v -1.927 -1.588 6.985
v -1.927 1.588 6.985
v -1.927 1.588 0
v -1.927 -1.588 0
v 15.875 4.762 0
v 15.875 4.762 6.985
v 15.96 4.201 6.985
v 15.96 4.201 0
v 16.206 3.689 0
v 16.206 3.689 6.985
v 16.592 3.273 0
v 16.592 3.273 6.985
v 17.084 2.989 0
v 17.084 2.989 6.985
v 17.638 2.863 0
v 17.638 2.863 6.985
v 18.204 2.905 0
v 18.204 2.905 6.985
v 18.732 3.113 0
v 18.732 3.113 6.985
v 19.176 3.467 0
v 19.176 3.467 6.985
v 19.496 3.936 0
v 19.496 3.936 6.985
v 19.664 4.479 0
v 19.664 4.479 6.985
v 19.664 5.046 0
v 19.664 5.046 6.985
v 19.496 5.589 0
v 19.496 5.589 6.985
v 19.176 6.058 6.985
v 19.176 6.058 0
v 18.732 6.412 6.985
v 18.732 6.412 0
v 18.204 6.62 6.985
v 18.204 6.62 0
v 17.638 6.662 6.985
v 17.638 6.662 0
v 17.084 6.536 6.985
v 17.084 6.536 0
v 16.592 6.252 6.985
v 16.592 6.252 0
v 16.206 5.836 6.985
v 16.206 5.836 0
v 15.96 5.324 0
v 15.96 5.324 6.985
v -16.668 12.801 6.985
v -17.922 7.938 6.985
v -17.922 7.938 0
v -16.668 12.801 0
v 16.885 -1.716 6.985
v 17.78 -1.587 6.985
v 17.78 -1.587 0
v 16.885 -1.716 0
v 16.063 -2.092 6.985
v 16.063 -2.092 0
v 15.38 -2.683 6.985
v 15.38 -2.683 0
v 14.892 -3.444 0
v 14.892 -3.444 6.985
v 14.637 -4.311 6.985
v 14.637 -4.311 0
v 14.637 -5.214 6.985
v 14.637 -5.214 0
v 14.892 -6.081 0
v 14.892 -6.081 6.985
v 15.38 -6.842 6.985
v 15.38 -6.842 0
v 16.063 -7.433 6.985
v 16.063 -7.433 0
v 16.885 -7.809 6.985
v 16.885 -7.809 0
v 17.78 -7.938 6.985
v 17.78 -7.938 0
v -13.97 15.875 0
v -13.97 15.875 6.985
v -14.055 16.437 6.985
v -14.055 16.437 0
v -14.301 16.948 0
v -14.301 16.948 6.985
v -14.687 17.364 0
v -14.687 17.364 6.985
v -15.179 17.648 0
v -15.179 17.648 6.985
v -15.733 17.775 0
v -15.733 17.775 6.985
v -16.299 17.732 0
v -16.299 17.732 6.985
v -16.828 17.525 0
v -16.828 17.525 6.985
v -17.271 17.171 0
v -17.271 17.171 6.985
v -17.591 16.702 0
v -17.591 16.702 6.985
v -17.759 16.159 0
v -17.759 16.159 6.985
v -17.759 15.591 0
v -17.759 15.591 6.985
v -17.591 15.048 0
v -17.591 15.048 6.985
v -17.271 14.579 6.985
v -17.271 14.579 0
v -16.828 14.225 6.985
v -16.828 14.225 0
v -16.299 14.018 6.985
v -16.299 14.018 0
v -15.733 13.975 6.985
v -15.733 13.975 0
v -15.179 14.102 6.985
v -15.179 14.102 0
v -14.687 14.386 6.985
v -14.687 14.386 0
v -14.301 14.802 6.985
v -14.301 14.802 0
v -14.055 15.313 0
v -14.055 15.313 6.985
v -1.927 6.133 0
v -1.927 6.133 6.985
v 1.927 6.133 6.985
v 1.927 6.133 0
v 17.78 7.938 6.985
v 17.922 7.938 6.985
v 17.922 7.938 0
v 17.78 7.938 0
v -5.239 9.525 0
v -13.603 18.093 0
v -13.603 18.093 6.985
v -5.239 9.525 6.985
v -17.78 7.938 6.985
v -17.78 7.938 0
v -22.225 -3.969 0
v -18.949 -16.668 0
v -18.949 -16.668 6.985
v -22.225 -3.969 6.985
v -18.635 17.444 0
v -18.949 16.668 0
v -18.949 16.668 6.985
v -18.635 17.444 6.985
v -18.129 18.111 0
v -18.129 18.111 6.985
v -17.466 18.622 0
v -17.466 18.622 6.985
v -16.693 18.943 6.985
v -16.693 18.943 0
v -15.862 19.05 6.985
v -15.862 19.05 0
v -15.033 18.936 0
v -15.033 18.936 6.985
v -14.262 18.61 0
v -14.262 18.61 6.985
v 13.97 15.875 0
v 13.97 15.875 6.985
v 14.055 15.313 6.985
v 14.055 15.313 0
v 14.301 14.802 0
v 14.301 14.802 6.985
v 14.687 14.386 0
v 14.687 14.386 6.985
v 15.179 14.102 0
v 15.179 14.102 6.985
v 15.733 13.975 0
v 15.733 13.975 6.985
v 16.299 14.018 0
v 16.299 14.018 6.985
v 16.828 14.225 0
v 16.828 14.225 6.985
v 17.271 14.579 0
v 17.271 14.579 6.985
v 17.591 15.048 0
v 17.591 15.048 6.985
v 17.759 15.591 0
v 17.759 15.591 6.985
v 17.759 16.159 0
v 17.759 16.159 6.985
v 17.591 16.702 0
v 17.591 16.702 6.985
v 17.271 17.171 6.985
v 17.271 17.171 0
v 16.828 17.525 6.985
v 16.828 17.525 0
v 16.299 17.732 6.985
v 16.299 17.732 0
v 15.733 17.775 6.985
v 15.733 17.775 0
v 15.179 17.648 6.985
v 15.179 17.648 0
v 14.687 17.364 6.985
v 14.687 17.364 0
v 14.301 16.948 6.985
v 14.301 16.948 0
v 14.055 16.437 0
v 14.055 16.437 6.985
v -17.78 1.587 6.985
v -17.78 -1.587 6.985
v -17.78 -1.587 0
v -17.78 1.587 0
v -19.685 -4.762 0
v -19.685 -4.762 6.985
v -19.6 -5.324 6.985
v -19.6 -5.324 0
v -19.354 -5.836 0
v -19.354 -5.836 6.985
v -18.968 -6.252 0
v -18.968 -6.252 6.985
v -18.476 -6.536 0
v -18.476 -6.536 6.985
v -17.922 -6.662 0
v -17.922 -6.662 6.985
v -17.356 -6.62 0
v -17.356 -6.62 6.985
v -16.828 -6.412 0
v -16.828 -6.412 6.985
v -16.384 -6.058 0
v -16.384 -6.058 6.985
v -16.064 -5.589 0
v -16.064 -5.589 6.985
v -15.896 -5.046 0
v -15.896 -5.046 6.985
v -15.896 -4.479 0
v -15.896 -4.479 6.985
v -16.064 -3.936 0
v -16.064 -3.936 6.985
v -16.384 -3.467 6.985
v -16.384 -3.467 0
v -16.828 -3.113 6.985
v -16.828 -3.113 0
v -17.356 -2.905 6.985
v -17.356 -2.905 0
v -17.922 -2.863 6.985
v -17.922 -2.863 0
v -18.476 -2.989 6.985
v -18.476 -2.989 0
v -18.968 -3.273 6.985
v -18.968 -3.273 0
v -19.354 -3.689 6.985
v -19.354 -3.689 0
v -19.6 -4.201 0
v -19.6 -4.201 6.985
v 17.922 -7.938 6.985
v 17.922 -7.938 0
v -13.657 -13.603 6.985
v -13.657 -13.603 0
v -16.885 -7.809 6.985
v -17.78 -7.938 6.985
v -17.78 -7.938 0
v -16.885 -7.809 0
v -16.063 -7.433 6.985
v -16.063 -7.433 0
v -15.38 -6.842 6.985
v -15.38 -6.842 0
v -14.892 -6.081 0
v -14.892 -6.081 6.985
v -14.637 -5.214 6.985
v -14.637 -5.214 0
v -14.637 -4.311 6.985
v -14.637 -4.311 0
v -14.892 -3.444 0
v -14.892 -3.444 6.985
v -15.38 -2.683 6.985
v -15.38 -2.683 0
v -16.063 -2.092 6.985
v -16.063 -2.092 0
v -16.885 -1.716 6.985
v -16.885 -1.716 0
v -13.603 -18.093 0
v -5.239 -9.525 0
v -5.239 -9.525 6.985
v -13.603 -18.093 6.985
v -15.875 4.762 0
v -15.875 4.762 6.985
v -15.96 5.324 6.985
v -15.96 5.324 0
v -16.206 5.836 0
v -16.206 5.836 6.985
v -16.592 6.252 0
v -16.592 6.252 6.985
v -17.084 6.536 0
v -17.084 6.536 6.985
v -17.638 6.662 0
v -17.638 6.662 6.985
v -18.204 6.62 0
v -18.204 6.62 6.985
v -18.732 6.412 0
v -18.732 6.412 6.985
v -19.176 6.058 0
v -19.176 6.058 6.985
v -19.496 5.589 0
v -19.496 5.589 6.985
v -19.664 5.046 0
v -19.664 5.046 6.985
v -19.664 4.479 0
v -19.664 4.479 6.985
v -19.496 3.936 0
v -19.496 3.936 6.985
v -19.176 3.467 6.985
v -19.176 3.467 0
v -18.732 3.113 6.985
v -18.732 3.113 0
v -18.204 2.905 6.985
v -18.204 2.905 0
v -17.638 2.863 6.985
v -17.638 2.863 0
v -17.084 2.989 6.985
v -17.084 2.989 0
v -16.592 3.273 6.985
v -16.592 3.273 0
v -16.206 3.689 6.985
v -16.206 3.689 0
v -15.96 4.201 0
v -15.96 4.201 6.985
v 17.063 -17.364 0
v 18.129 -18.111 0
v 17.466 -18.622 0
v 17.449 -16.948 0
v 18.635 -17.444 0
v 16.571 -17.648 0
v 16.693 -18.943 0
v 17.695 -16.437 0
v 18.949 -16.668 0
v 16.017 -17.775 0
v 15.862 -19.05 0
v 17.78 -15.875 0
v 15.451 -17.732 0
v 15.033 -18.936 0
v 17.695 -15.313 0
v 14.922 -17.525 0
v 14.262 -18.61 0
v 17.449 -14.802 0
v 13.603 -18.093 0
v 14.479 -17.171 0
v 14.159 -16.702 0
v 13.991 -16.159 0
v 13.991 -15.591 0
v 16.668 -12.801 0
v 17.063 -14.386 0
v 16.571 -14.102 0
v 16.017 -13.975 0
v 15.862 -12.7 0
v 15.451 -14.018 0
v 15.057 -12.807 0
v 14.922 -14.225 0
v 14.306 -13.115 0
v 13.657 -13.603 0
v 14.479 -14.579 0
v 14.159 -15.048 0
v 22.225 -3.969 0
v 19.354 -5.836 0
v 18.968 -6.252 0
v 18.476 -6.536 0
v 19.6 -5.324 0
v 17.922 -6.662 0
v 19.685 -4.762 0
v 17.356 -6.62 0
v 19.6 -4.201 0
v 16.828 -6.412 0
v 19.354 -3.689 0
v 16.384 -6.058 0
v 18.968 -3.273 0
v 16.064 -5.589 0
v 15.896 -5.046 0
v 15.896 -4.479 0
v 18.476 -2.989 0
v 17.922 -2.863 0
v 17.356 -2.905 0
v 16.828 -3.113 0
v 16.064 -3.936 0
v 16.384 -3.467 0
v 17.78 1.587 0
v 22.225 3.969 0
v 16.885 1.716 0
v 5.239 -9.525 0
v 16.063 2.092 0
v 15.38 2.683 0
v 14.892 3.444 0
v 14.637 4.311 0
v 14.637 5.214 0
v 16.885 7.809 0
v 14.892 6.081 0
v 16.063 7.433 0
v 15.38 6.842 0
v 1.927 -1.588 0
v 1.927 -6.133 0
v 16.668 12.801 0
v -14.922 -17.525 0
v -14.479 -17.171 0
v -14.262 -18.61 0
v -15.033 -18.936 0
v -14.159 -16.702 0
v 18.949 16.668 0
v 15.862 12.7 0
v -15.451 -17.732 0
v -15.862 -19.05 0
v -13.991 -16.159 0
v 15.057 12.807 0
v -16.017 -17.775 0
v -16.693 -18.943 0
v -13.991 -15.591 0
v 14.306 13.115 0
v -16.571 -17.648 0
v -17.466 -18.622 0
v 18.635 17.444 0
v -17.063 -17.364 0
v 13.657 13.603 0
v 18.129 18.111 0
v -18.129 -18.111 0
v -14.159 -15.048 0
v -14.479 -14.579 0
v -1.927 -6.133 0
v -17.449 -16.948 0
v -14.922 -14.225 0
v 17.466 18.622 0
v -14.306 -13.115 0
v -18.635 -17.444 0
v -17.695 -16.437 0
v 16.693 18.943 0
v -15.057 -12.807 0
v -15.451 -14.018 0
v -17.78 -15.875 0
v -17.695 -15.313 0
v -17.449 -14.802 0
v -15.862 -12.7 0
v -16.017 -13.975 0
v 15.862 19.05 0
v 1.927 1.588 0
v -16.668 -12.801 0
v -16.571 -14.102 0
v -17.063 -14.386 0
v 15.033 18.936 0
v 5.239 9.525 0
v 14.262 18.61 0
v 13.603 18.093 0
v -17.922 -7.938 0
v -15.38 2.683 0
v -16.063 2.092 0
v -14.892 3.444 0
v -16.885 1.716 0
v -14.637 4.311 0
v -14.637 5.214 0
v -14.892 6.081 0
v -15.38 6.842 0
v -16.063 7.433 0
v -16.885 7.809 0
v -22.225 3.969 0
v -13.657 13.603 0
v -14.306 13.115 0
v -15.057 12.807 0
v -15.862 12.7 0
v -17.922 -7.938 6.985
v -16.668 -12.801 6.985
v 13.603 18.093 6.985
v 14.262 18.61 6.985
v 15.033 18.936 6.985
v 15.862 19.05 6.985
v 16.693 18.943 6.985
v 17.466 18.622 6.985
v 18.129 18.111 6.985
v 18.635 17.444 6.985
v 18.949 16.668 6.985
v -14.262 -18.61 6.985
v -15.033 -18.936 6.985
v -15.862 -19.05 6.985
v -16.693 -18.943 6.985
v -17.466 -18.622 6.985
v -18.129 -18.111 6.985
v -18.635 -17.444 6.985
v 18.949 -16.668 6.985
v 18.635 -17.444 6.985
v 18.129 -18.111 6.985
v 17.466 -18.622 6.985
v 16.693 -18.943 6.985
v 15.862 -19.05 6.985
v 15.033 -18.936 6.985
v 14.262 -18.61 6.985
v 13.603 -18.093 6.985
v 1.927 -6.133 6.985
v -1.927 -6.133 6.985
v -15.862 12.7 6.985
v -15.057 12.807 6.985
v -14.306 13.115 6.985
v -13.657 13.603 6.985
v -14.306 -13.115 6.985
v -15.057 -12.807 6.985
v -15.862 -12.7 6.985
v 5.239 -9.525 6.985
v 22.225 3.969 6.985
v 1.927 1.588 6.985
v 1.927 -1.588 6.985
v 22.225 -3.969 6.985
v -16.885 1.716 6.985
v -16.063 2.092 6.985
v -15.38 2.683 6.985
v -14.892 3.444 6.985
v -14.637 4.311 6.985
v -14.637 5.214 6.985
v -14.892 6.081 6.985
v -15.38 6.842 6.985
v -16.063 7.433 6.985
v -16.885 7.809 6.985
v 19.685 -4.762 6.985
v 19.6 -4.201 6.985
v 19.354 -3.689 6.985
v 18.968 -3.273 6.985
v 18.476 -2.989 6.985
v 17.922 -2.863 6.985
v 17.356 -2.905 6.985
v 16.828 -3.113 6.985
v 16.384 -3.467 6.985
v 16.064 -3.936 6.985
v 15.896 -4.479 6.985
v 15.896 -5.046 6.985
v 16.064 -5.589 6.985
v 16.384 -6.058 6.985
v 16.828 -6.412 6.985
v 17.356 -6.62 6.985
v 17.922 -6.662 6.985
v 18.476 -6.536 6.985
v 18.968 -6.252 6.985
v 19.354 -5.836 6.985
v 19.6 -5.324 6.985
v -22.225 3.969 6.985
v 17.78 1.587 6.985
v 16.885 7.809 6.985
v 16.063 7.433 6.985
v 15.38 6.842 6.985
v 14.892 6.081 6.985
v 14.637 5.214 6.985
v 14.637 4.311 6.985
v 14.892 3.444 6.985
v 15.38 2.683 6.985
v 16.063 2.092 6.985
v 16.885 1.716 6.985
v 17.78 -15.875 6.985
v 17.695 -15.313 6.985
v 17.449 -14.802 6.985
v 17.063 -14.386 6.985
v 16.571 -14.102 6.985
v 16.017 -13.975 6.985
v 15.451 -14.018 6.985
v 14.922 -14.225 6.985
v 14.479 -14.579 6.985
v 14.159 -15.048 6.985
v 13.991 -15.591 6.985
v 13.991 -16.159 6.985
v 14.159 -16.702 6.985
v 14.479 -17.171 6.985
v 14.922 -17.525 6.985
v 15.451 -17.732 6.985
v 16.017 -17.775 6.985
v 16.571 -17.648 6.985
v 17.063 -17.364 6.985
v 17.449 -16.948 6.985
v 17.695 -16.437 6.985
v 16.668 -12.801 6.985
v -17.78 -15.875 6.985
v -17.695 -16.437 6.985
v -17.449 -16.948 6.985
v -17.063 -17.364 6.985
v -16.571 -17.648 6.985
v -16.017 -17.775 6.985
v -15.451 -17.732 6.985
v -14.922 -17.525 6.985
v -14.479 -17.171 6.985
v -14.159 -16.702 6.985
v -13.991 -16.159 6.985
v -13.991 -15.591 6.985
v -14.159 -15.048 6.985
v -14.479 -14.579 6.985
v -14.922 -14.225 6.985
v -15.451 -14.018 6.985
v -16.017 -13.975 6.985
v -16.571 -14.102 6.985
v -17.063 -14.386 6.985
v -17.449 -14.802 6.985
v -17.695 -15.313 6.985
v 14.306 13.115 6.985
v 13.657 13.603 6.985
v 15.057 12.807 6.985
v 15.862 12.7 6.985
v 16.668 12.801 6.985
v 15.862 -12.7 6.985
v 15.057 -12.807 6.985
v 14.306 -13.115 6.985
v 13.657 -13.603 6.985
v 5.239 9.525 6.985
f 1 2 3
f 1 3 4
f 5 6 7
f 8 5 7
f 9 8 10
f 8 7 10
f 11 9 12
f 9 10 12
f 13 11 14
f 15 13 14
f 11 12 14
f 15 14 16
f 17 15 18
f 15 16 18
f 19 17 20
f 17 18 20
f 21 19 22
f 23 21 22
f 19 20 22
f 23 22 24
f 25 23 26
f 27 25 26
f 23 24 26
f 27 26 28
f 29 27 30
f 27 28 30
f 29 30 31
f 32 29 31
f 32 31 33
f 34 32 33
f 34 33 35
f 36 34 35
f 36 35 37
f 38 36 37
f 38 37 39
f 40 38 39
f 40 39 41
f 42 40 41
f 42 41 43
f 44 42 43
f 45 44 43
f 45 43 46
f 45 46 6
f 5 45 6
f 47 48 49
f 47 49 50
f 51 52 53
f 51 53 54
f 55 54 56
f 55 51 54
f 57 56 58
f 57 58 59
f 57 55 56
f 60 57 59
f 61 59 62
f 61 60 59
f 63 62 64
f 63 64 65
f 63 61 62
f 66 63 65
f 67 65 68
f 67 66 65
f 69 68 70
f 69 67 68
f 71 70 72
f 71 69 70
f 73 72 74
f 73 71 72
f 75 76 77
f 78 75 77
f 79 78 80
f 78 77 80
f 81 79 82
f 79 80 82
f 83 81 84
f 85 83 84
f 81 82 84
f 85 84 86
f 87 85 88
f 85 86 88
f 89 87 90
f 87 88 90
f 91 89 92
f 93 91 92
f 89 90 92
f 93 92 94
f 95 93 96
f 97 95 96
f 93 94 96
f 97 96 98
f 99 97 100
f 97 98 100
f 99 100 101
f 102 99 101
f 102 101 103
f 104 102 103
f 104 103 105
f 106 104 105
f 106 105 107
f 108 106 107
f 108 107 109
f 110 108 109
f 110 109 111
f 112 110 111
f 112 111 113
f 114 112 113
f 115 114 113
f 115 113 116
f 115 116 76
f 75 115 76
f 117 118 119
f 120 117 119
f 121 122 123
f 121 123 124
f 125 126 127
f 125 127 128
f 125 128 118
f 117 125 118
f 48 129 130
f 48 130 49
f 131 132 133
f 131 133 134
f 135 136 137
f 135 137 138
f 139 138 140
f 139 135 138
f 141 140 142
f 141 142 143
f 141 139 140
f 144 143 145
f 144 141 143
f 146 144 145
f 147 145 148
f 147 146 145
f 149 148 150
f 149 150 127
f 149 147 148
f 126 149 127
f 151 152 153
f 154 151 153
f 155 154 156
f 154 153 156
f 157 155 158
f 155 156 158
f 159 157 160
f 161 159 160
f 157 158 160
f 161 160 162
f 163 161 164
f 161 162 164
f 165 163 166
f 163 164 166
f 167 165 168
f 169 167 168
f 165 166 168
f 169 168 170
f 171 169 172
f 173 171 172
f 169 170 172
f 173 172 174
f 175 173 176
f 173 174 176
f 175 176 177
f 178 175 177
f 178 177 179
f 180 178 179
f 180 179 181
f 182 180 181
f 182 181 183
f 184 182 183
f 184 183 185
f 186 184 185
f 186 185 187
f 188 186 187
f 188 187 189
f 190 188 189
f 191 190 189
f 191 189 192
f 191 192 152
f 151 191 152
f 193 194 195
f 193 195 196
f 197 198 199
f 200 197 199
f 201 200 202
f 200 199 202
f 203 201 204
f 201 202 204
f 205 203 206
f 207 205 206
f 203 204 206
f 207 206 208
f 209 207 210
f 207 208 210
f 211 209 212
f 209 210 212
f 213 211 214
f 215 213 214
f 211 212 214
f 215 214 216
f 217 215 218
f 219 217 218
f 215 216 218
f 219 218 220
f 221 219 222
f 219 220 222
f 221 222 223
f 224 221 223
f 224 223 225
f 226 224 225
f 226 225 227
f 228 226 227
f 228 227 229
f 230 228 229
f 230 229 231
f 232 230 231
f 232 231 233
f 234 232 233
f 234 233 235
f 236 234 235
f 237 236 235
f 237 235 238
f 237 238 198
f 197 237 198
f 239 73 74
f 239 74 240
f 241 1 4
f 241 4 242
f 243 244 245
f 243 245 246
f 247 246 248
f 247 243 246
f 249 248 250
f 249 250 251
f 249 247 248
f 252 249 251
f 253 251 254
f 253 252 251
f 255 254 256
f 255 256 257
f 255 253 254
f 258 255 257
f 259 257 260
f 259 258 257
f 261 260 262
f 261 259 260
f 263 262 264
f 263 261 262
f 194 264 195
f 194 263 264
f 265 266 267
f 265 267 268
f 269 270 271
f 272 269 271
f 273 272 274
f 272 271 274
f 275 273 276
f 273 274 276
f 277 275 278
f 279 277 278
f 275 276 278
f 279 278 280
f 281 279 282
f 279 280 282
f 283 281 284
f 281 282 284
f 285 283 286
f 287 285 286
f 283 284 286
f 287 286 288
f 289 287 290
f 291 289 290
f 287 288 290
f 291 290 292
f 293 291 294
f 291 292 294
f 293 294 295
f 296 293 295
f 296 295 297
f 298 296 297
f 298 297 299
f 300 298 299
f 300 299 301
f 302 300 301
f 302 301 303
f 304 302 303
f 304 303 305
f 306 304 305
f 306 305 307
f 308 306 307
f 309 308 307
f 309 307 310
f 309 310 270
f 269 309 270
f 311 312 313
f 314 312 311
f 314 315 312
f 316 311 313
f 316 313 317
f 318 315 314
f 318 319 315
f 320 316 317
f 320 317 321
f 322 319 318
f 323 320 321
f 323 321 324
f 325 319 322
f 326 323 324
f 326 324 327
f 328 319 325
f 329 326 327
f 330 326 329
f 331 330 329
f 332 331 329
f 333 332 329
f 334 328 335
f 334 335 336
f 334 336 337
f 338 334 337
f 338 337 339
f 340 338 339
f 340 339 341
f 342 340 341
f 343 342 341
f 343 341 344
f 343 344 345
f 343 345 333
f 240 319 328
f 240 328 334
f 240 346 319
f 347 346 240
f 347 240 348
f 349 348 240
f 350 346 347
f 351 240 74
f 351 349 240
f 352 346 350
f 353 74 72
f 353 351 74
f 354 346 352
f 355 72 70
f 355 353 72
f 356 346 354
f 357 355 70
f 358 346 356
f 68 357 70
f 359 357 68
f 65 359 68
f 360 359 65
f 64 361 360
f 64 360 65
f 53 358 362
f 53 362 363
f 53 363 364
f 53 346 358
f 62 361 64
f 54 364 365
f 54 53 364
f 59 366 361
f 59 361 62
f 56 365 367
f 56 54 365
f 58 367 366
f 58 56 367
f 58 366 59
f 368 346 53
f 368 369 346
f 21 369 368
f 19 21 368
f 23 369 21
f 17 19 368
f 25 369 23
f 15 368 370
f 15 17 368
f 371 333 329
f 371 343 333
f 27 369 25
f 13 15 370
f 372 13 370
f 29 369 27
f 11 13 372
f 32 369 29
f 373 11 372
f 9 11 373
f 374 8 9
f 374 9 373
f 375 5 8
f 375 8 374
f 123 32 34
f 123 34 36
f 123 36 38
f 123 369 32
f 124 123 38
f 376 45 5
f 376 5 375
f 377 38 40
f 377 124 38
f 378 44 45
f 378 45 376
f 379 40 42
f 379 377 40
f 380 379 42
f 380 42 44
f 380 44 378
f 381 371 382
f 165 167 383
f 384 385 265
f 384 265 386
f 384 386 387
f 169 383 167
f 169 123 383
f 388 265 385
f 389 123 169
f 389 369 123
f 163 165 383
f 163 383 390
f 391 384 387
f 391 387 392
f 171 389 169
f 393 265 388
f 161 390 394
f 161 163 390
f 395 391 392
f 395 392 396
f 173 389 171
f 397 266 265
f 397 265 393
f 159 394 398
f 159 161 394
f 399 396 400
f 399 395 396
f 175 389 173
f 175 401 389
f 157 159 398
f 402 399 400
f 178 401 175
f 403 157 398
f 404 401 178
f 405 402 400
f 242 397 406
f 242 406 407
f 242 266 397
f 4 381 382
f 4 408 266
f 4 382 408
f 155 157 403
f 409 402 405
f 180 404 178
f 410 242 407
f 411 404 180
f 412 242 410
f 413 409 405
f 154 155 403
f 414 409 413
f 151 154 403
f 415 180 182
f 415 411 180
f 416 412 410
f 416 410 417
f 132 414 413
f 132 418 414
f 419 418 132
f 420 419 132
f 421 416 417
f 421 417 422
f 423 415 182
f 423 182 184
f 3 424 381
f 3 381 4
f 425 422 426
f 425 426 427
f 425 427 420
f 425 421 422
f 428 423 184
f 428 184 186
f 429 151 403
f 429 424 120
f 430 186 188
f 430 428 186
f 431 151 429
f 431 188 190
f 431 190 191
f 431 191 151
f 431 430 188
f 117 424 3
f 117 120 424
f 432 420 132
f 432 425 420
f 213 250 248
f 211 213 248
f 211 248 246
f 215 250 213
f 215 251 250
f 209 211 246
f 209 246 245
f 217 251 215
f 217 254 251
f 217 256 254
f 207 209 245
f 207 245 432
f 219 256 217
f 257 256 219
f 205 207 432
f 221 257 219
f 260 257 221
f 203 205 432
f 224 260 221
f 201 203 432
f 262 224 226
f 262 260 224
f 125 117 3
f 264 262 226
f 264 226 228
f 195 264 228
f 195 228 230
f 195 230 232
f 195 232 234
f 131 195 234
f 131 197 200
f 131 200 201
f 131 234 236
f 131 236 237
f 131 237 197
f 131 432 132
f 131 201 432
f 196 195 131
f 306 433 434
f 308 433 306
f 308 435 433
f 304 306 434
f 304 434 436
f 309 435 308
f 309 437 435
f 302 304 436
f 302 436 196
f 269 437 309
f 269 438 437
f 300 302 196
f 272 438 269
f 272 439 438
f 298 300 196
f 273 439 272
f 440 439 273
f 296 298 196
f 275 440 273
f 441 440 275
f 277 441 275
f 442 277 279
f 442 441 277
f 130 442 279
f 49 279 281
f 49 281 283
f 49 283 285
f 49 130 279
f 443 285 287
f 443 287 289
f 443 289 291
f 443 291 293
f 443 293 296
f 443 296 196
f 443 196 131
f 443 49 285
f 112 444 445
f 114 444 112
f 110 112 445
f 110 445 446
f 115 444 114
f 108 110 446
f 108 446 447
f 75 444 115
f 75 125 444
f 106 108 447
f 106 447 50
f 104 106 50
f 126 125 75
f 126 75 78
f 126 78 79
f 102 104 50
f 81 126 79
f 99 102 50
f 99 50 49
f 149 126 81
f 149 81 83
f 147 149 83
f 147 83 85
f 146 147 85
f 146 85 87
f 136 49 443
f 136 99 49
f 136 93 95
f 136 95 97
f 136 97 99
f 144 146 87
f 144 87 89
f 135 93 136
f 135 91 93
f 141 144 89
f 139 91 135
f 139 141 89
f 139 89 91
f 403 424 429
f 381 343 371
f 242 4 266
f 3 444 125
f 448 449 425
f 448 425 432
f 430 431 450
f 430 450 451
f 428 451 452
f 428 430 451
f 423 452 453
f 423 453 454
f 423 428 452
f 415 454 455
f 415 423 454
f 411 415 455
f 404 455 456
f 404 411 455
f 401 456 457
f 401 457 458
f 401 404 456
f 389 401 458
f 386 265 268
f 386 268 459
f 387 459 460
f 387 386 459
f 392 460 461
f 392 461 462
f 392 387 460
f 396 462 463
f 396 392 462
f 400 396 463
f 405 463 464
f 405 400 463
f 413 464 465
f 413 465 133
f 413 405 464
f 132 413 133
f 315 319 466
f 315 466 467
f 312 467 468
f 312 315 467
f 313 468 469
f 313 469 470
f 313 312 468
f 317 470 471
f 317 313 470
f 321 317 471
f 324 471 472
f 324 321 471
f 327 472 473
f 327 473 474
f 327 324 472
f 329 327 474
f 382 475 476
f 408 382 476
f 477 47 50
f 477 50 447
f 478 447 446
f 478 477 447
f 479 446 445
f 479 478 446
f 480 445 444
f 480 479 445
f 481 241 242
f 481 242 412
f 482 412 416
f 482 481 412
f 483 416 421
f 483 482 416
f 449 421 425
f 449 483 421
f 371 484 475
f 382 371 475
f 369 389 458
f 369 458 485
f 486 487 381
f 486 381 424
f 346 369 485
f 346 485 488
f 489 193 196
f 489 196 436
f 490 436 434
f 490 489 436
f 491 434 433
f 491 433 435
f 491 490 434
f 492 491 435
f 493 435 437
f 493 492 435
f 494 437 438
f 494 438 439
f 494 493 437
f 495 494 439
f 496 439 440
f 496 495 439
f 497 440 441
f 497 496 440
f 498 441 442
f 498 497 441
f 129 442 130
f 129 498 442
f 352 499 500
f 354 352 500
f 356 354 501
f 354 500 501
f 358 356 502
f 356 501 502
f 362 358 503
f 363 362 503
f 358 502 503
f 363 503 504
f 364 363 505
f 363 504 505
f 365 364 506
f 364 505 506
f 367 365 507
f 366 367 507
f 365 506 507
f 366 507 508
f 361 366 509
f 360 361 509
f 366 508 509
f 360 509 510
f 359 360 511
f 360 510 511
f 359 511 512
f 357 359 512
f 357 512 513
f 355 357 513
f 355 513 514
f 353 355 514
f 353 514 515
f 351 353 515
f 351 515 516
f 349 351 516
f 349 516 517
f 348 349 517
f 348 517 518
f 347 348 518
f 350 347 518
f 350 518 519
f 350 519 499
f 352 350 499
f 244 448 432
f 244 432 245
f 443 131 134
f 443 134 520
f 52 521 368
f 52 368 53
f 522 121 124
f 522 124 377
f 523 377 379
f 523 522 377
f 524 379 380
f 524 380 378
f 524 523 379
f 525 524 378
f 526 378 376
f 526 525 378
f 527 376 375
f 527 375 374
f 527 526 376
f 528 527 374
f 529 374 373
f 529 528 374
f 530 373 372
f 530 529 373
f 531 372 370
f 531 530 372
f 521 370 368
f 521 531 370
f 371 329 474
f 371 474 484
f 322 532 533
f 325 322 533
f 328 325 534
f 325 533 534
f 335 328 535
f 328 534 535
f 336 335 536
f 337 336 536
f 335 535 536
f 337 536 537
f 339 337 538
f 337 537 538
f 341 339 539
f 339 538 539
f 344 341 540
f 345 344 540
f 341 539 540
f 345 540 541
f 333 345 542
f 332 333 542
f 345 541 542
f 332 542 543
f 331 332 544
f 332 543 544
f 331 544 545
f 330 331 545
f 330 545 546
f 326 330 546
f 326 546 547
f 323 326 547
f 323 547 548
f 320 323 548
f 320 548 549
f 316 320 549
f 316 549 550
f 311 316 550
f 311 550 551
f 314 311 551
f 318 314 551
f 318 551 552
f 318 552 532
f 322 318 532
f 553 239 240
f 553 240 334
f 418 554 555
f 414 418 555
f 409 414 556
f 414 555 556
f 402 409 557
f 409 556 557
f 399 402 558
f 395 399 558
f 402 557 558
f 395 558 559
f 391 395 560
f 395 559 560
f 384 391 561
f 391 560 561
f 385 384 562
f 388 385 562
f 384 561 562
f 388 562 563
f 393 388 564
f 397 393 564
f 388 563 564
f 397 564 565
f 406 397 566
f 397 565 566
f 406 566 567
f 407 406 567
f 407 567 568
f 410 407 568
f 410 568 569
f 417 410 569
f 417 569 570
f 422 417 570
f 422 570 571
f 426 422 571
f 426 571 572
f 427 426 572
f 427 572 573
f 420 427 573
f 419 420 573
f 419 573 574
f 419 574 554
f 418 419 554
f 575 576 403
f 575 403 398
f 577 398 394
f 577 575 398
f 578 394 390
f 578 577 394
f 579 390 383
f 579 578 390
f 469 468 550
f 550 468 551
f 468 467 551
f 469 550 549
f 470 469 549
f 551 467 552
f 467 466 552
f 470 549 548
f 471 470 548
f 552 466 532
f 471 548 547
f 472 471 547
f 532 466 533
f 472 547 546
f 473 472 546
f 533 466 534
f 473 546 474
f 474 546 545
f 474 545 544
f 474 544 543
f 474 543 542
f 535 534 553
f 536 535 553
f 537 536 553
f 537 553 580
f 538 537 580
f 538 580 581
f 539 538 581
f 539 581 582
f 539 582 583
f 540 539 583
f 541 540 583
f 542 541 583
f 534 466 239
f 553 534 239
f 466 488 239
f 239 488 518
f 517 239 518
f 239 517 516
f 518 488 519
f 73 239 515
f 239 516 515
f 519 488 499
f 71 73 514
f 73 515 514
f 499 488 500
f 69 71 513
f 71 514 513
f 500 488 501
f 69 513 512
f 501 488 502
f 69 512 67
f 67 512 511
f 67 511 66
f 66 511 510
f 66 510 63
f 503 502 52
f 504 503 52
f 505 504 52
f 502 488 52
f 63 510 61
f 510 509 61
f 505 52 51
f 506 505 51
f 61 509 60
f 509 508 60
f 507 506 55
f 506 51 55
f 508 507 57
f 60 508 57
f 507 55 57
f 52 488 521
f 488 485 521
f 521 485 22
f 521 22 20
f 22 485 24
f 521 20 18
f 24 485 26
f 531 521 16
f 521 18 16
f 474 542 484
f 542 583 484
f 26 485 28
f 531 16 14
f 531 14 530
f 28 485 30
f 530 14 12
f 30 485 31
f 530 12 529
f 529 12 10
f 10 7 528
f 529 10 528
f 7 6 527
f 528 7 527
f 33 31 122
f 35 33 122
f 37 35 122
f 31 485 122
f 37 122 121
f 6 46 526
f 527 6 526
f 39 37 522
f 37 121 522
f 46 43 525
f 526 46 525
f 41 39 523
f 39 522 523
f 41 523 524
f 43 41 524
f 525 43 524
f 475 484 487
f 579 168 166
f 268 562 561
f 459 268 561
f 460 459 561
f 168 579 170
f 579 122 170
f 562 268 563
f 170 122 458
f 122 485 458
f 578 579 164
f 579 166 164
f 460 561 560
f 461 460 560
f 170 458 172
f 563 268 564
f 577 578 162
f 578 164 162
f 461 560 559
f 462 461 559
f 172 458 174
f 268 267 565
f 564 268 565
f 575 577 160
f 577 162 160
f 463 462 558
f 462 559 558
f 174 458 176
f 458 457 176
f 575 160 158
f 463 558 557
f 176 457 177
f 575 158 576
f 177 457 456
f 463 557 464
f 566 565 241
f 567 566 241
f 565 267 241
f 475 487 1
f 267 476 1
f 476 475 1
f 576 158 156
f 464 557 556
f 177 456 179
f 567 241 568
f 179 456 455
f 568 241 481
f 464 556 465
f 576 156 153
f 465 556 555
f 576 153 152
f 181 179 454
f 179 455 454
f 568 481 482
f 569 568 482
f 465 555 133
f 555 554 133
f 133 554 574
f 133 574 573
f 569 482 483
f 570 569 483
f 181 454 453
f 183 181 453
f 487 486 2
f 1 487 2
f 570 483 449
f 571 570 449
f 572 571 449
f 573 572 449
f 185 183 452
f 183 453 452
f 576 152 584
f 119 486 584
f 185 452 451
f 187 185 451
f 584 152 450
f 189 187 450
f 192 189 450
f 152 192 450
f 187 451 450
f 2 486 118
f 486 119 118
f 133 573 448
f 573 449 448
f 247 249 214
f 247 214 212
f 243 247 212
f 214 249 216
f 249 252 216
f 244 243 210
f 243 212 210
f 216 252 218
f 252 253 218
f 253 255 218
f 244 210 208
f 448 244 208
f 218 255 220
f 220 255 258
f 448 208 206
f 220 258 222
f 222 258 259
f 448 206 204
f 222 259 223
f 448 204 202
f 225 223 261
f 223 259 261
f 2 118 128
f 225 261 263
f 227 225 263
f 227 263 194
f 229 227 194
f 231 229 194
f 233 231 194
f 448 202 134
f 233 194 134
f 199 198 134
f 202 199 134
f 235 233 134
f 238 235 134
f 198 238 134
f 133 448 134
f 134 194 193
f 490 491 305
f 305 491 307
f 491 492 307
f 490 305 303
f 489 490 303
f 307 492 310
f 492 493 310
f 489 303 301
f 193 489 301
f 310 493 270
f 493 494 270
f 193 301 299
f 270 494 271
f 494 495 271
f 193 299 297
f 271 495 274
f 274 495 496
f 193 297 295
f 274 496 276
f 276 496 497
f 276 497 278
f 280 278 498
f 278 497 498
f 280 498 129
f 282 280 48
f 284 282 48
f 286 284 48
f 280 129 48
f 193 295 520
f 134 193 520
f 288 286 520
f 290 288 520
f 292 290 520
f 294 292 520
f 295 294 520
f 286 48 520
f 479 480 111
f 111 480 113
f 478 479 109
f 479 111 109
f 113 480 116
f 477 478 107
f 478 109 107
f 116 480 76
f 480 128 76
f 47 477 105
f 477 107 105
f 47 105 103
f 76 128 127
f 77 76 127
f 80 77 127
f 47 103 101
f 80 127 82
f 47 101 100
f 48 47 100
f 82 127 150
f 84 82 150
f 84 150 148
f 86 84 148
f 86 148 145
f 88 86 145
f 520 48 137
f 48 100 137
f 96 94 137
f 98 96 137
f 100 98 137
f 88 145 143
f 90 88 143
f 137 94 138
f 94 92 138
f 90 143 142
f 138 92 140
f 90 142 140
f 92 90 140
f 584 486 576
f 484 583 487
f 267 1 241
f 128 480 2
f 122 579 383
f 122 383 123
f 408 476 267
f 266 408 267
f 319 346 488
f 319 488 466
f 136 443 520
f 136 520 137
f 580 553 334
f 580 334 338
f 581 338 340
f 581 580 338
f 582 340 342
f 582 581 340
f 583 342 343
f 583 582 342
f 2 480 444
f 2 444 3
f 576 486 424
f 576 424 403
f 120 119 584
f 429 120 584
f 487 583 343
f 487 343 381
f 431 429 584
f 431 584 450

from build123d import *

# Parameters (mm, degrees)
BOSS_EXTRUDE1_DEPTH = 6.985
SKETCH3_R           = 1.905
CUT_EXTRUDE1_DEPTH  = 31.093908852


with BuildPart() as part:
    # Sketch1 → Boss-Extrude1 (new body)
    with BuildSketch(Plane.XY):
        with BuildLine():
            Line((-5.23875, -9.525), (-13.603110789, -18.092914429))
            ThreePointArc((-13.603110789, -18.092914429), (-16.692674217, -18.942903824), (-18.949374194, -16.66799957))
            Line((-18.949374194, -16.66799957), (-22.225, -3.96875))
            Line((-22.225, -3.96875), (-22.225, 3.96875))
            Line((-22.225, 3.96875), (-18.949374194, 16.66799957))
            ThreePointArc((-18.949374194, 16.66799957), (-16.692674217, 18.942903824), (-13.603110789, 18.092914429))
            Line((-13.603110789, 18.092914429), (-5.23875, 9.525))
            Line((-5.23875, 9.525), (5.23875, 9.525))
            Line((5.23875, 9.525), (13.603110789, 18.092914429))
            ThreePointArc((13.603110789, 18.092914429), (16.692674217, 18.942903824), (18.949374194, 16.66799957))
            Line((18.949374194, 16.66799957), (22.225, 3.96875))
            Line((22.225, 3.96875), (22.225, -3.96875))
            Line((22.225, -3.96875), (18.949374194, -16.66799957))
            ThreePointArc((18.949374194, -16.66799957), (16.692674217, -18.942903824), (13.603110789, -18.092914429))
            Line((13.603110789, -18.092914429), (5.23875, -9.525))
            Line((5.23875, -9.525), (-5.23875, -9.525))
        make_face()
    extrude(amount=BOSS_EXTRUDE1_DEPTH)

    # Sketch3 → Cut-Extrude1 (cut, through all)
    with BuildSketch(Plane.XY.offset(6.985)):
        with Locations((-15.875, 15.875)):
            Circle(SKETCH3_R)
        with Locations((-17.78, 4.7625)):
            Circle(SKETCH3_R)
        with Locations(Location((17.78, 4.7625, 0), (0, 0, 180))):
            Circle(SKETCH3_R)
        with Locations((17.78, -4.7625)):
            Circle(SKETCH3_R)
        with Locations(Location((-17.78, -4.7625, 0), (0, 0, 180))):
            Circle(SKETCH3_R)
        with Locations(Location((15.875, 15.875, 0), (0, 0, 180))):
            Circle(SKETCH3_R)
        with Locations((15.875, -15.875)):
            Circle(SKETCH3_R)
        with Locations(Location((-15.875, -15.875, 0), (0, 0, 180))):
            Circle(SKETCH3_R)
        Polygon((-1.926937637, 6.132591943), (1.926937637, 6.132591943), (5.23875, 9.525), (-5.23875, 9.525), align=None)
        with BuildLine():
            Line((-17.922387107, 7.9375), (-16.66799957, 12.800625806))
            ThreePointArc((-16.66799957, 12.800625806), (-15.057325783, 12.807096176), (-13.657085571, 13.603110789))
            Line((-13.657085571, 13.603110789), (-1.926937637, 1.5875))
            Line((-1.926937637, 1.5875), (-1.926937637, -1.5875))
            Line((-1.926937637, -1.5875), (-13.657085571, -13.603110789))
            ThreePointArc((-13.657085571, -13.603110789), (-15.057325783, -12.807096176), (-16.66799957, -12.800625806))
            Line((-16.66799957, -12.800625806), (-17.922387107, -7.9375))
            Line((-17.922387107, -7.9375), (-17.78, -7.9375))
            ThreePointArc((-17.78, -7.9375), (-14.605, -4.7625), (-17.78, -1.5875))
            Line((-17.78, -1.5875), (-17.78, 1.5875))
            ThreePointArc((-17.78, 1.5875), (-14.605, 4.7625), (-17.78, 7.9375))
            Line((-17.78, 7.9375), (-17.922387107, 7.9375))
        make_face()
        with BuildLine():
            Line((17.922387107, -7.9375), (16.66799957, -12.800625806))
            ThreePointArc((16.66799957, -12.800625806), (15.057325783, -12.807096176), (13.657085571, -13.603110789))
            Line((13.657085571, -13.603110789), (1.926937637, -1.5875))
            Line((1.926937637, -1.5875), (1.926937637, 1.5875))
            Line((1.926937637, 1.5875), (13.657085571, 13.603110789))
            ThreePointArc((13.657085571, 13.603110789), (15.057325783, 12.807096176), (16.66799957, 12.800625806))
            Line((16.66799957, 12.800625806), (17.922387107, 7.9375))
            Line((17.922387107, 7.9375), (17.78, 7.9375))
            ThreePointArc((17.78, 7.9375), (14.605, 4.7625), (17.78, 1.5875))
            Line((17.78, 1.5875), (17.78, -1.5875))
            ThreePointArc((17.78, -1.5875), (14.605, -4.7625), (17.78, -7.9375))
            Line((17.78, -7.9375), (17.922387107, -7.9375))
        make_face()
        Polygon((-5.23875, -9.525), (5.23875, -9.525), (1.926937637, -6.132591943), (-1.926937637, -6.132591943), align=None)
    extrude(amount=-CUT_EXTRUDE1_DEPTH, mode=Mode.SUBTRACT)


solid = part.part
